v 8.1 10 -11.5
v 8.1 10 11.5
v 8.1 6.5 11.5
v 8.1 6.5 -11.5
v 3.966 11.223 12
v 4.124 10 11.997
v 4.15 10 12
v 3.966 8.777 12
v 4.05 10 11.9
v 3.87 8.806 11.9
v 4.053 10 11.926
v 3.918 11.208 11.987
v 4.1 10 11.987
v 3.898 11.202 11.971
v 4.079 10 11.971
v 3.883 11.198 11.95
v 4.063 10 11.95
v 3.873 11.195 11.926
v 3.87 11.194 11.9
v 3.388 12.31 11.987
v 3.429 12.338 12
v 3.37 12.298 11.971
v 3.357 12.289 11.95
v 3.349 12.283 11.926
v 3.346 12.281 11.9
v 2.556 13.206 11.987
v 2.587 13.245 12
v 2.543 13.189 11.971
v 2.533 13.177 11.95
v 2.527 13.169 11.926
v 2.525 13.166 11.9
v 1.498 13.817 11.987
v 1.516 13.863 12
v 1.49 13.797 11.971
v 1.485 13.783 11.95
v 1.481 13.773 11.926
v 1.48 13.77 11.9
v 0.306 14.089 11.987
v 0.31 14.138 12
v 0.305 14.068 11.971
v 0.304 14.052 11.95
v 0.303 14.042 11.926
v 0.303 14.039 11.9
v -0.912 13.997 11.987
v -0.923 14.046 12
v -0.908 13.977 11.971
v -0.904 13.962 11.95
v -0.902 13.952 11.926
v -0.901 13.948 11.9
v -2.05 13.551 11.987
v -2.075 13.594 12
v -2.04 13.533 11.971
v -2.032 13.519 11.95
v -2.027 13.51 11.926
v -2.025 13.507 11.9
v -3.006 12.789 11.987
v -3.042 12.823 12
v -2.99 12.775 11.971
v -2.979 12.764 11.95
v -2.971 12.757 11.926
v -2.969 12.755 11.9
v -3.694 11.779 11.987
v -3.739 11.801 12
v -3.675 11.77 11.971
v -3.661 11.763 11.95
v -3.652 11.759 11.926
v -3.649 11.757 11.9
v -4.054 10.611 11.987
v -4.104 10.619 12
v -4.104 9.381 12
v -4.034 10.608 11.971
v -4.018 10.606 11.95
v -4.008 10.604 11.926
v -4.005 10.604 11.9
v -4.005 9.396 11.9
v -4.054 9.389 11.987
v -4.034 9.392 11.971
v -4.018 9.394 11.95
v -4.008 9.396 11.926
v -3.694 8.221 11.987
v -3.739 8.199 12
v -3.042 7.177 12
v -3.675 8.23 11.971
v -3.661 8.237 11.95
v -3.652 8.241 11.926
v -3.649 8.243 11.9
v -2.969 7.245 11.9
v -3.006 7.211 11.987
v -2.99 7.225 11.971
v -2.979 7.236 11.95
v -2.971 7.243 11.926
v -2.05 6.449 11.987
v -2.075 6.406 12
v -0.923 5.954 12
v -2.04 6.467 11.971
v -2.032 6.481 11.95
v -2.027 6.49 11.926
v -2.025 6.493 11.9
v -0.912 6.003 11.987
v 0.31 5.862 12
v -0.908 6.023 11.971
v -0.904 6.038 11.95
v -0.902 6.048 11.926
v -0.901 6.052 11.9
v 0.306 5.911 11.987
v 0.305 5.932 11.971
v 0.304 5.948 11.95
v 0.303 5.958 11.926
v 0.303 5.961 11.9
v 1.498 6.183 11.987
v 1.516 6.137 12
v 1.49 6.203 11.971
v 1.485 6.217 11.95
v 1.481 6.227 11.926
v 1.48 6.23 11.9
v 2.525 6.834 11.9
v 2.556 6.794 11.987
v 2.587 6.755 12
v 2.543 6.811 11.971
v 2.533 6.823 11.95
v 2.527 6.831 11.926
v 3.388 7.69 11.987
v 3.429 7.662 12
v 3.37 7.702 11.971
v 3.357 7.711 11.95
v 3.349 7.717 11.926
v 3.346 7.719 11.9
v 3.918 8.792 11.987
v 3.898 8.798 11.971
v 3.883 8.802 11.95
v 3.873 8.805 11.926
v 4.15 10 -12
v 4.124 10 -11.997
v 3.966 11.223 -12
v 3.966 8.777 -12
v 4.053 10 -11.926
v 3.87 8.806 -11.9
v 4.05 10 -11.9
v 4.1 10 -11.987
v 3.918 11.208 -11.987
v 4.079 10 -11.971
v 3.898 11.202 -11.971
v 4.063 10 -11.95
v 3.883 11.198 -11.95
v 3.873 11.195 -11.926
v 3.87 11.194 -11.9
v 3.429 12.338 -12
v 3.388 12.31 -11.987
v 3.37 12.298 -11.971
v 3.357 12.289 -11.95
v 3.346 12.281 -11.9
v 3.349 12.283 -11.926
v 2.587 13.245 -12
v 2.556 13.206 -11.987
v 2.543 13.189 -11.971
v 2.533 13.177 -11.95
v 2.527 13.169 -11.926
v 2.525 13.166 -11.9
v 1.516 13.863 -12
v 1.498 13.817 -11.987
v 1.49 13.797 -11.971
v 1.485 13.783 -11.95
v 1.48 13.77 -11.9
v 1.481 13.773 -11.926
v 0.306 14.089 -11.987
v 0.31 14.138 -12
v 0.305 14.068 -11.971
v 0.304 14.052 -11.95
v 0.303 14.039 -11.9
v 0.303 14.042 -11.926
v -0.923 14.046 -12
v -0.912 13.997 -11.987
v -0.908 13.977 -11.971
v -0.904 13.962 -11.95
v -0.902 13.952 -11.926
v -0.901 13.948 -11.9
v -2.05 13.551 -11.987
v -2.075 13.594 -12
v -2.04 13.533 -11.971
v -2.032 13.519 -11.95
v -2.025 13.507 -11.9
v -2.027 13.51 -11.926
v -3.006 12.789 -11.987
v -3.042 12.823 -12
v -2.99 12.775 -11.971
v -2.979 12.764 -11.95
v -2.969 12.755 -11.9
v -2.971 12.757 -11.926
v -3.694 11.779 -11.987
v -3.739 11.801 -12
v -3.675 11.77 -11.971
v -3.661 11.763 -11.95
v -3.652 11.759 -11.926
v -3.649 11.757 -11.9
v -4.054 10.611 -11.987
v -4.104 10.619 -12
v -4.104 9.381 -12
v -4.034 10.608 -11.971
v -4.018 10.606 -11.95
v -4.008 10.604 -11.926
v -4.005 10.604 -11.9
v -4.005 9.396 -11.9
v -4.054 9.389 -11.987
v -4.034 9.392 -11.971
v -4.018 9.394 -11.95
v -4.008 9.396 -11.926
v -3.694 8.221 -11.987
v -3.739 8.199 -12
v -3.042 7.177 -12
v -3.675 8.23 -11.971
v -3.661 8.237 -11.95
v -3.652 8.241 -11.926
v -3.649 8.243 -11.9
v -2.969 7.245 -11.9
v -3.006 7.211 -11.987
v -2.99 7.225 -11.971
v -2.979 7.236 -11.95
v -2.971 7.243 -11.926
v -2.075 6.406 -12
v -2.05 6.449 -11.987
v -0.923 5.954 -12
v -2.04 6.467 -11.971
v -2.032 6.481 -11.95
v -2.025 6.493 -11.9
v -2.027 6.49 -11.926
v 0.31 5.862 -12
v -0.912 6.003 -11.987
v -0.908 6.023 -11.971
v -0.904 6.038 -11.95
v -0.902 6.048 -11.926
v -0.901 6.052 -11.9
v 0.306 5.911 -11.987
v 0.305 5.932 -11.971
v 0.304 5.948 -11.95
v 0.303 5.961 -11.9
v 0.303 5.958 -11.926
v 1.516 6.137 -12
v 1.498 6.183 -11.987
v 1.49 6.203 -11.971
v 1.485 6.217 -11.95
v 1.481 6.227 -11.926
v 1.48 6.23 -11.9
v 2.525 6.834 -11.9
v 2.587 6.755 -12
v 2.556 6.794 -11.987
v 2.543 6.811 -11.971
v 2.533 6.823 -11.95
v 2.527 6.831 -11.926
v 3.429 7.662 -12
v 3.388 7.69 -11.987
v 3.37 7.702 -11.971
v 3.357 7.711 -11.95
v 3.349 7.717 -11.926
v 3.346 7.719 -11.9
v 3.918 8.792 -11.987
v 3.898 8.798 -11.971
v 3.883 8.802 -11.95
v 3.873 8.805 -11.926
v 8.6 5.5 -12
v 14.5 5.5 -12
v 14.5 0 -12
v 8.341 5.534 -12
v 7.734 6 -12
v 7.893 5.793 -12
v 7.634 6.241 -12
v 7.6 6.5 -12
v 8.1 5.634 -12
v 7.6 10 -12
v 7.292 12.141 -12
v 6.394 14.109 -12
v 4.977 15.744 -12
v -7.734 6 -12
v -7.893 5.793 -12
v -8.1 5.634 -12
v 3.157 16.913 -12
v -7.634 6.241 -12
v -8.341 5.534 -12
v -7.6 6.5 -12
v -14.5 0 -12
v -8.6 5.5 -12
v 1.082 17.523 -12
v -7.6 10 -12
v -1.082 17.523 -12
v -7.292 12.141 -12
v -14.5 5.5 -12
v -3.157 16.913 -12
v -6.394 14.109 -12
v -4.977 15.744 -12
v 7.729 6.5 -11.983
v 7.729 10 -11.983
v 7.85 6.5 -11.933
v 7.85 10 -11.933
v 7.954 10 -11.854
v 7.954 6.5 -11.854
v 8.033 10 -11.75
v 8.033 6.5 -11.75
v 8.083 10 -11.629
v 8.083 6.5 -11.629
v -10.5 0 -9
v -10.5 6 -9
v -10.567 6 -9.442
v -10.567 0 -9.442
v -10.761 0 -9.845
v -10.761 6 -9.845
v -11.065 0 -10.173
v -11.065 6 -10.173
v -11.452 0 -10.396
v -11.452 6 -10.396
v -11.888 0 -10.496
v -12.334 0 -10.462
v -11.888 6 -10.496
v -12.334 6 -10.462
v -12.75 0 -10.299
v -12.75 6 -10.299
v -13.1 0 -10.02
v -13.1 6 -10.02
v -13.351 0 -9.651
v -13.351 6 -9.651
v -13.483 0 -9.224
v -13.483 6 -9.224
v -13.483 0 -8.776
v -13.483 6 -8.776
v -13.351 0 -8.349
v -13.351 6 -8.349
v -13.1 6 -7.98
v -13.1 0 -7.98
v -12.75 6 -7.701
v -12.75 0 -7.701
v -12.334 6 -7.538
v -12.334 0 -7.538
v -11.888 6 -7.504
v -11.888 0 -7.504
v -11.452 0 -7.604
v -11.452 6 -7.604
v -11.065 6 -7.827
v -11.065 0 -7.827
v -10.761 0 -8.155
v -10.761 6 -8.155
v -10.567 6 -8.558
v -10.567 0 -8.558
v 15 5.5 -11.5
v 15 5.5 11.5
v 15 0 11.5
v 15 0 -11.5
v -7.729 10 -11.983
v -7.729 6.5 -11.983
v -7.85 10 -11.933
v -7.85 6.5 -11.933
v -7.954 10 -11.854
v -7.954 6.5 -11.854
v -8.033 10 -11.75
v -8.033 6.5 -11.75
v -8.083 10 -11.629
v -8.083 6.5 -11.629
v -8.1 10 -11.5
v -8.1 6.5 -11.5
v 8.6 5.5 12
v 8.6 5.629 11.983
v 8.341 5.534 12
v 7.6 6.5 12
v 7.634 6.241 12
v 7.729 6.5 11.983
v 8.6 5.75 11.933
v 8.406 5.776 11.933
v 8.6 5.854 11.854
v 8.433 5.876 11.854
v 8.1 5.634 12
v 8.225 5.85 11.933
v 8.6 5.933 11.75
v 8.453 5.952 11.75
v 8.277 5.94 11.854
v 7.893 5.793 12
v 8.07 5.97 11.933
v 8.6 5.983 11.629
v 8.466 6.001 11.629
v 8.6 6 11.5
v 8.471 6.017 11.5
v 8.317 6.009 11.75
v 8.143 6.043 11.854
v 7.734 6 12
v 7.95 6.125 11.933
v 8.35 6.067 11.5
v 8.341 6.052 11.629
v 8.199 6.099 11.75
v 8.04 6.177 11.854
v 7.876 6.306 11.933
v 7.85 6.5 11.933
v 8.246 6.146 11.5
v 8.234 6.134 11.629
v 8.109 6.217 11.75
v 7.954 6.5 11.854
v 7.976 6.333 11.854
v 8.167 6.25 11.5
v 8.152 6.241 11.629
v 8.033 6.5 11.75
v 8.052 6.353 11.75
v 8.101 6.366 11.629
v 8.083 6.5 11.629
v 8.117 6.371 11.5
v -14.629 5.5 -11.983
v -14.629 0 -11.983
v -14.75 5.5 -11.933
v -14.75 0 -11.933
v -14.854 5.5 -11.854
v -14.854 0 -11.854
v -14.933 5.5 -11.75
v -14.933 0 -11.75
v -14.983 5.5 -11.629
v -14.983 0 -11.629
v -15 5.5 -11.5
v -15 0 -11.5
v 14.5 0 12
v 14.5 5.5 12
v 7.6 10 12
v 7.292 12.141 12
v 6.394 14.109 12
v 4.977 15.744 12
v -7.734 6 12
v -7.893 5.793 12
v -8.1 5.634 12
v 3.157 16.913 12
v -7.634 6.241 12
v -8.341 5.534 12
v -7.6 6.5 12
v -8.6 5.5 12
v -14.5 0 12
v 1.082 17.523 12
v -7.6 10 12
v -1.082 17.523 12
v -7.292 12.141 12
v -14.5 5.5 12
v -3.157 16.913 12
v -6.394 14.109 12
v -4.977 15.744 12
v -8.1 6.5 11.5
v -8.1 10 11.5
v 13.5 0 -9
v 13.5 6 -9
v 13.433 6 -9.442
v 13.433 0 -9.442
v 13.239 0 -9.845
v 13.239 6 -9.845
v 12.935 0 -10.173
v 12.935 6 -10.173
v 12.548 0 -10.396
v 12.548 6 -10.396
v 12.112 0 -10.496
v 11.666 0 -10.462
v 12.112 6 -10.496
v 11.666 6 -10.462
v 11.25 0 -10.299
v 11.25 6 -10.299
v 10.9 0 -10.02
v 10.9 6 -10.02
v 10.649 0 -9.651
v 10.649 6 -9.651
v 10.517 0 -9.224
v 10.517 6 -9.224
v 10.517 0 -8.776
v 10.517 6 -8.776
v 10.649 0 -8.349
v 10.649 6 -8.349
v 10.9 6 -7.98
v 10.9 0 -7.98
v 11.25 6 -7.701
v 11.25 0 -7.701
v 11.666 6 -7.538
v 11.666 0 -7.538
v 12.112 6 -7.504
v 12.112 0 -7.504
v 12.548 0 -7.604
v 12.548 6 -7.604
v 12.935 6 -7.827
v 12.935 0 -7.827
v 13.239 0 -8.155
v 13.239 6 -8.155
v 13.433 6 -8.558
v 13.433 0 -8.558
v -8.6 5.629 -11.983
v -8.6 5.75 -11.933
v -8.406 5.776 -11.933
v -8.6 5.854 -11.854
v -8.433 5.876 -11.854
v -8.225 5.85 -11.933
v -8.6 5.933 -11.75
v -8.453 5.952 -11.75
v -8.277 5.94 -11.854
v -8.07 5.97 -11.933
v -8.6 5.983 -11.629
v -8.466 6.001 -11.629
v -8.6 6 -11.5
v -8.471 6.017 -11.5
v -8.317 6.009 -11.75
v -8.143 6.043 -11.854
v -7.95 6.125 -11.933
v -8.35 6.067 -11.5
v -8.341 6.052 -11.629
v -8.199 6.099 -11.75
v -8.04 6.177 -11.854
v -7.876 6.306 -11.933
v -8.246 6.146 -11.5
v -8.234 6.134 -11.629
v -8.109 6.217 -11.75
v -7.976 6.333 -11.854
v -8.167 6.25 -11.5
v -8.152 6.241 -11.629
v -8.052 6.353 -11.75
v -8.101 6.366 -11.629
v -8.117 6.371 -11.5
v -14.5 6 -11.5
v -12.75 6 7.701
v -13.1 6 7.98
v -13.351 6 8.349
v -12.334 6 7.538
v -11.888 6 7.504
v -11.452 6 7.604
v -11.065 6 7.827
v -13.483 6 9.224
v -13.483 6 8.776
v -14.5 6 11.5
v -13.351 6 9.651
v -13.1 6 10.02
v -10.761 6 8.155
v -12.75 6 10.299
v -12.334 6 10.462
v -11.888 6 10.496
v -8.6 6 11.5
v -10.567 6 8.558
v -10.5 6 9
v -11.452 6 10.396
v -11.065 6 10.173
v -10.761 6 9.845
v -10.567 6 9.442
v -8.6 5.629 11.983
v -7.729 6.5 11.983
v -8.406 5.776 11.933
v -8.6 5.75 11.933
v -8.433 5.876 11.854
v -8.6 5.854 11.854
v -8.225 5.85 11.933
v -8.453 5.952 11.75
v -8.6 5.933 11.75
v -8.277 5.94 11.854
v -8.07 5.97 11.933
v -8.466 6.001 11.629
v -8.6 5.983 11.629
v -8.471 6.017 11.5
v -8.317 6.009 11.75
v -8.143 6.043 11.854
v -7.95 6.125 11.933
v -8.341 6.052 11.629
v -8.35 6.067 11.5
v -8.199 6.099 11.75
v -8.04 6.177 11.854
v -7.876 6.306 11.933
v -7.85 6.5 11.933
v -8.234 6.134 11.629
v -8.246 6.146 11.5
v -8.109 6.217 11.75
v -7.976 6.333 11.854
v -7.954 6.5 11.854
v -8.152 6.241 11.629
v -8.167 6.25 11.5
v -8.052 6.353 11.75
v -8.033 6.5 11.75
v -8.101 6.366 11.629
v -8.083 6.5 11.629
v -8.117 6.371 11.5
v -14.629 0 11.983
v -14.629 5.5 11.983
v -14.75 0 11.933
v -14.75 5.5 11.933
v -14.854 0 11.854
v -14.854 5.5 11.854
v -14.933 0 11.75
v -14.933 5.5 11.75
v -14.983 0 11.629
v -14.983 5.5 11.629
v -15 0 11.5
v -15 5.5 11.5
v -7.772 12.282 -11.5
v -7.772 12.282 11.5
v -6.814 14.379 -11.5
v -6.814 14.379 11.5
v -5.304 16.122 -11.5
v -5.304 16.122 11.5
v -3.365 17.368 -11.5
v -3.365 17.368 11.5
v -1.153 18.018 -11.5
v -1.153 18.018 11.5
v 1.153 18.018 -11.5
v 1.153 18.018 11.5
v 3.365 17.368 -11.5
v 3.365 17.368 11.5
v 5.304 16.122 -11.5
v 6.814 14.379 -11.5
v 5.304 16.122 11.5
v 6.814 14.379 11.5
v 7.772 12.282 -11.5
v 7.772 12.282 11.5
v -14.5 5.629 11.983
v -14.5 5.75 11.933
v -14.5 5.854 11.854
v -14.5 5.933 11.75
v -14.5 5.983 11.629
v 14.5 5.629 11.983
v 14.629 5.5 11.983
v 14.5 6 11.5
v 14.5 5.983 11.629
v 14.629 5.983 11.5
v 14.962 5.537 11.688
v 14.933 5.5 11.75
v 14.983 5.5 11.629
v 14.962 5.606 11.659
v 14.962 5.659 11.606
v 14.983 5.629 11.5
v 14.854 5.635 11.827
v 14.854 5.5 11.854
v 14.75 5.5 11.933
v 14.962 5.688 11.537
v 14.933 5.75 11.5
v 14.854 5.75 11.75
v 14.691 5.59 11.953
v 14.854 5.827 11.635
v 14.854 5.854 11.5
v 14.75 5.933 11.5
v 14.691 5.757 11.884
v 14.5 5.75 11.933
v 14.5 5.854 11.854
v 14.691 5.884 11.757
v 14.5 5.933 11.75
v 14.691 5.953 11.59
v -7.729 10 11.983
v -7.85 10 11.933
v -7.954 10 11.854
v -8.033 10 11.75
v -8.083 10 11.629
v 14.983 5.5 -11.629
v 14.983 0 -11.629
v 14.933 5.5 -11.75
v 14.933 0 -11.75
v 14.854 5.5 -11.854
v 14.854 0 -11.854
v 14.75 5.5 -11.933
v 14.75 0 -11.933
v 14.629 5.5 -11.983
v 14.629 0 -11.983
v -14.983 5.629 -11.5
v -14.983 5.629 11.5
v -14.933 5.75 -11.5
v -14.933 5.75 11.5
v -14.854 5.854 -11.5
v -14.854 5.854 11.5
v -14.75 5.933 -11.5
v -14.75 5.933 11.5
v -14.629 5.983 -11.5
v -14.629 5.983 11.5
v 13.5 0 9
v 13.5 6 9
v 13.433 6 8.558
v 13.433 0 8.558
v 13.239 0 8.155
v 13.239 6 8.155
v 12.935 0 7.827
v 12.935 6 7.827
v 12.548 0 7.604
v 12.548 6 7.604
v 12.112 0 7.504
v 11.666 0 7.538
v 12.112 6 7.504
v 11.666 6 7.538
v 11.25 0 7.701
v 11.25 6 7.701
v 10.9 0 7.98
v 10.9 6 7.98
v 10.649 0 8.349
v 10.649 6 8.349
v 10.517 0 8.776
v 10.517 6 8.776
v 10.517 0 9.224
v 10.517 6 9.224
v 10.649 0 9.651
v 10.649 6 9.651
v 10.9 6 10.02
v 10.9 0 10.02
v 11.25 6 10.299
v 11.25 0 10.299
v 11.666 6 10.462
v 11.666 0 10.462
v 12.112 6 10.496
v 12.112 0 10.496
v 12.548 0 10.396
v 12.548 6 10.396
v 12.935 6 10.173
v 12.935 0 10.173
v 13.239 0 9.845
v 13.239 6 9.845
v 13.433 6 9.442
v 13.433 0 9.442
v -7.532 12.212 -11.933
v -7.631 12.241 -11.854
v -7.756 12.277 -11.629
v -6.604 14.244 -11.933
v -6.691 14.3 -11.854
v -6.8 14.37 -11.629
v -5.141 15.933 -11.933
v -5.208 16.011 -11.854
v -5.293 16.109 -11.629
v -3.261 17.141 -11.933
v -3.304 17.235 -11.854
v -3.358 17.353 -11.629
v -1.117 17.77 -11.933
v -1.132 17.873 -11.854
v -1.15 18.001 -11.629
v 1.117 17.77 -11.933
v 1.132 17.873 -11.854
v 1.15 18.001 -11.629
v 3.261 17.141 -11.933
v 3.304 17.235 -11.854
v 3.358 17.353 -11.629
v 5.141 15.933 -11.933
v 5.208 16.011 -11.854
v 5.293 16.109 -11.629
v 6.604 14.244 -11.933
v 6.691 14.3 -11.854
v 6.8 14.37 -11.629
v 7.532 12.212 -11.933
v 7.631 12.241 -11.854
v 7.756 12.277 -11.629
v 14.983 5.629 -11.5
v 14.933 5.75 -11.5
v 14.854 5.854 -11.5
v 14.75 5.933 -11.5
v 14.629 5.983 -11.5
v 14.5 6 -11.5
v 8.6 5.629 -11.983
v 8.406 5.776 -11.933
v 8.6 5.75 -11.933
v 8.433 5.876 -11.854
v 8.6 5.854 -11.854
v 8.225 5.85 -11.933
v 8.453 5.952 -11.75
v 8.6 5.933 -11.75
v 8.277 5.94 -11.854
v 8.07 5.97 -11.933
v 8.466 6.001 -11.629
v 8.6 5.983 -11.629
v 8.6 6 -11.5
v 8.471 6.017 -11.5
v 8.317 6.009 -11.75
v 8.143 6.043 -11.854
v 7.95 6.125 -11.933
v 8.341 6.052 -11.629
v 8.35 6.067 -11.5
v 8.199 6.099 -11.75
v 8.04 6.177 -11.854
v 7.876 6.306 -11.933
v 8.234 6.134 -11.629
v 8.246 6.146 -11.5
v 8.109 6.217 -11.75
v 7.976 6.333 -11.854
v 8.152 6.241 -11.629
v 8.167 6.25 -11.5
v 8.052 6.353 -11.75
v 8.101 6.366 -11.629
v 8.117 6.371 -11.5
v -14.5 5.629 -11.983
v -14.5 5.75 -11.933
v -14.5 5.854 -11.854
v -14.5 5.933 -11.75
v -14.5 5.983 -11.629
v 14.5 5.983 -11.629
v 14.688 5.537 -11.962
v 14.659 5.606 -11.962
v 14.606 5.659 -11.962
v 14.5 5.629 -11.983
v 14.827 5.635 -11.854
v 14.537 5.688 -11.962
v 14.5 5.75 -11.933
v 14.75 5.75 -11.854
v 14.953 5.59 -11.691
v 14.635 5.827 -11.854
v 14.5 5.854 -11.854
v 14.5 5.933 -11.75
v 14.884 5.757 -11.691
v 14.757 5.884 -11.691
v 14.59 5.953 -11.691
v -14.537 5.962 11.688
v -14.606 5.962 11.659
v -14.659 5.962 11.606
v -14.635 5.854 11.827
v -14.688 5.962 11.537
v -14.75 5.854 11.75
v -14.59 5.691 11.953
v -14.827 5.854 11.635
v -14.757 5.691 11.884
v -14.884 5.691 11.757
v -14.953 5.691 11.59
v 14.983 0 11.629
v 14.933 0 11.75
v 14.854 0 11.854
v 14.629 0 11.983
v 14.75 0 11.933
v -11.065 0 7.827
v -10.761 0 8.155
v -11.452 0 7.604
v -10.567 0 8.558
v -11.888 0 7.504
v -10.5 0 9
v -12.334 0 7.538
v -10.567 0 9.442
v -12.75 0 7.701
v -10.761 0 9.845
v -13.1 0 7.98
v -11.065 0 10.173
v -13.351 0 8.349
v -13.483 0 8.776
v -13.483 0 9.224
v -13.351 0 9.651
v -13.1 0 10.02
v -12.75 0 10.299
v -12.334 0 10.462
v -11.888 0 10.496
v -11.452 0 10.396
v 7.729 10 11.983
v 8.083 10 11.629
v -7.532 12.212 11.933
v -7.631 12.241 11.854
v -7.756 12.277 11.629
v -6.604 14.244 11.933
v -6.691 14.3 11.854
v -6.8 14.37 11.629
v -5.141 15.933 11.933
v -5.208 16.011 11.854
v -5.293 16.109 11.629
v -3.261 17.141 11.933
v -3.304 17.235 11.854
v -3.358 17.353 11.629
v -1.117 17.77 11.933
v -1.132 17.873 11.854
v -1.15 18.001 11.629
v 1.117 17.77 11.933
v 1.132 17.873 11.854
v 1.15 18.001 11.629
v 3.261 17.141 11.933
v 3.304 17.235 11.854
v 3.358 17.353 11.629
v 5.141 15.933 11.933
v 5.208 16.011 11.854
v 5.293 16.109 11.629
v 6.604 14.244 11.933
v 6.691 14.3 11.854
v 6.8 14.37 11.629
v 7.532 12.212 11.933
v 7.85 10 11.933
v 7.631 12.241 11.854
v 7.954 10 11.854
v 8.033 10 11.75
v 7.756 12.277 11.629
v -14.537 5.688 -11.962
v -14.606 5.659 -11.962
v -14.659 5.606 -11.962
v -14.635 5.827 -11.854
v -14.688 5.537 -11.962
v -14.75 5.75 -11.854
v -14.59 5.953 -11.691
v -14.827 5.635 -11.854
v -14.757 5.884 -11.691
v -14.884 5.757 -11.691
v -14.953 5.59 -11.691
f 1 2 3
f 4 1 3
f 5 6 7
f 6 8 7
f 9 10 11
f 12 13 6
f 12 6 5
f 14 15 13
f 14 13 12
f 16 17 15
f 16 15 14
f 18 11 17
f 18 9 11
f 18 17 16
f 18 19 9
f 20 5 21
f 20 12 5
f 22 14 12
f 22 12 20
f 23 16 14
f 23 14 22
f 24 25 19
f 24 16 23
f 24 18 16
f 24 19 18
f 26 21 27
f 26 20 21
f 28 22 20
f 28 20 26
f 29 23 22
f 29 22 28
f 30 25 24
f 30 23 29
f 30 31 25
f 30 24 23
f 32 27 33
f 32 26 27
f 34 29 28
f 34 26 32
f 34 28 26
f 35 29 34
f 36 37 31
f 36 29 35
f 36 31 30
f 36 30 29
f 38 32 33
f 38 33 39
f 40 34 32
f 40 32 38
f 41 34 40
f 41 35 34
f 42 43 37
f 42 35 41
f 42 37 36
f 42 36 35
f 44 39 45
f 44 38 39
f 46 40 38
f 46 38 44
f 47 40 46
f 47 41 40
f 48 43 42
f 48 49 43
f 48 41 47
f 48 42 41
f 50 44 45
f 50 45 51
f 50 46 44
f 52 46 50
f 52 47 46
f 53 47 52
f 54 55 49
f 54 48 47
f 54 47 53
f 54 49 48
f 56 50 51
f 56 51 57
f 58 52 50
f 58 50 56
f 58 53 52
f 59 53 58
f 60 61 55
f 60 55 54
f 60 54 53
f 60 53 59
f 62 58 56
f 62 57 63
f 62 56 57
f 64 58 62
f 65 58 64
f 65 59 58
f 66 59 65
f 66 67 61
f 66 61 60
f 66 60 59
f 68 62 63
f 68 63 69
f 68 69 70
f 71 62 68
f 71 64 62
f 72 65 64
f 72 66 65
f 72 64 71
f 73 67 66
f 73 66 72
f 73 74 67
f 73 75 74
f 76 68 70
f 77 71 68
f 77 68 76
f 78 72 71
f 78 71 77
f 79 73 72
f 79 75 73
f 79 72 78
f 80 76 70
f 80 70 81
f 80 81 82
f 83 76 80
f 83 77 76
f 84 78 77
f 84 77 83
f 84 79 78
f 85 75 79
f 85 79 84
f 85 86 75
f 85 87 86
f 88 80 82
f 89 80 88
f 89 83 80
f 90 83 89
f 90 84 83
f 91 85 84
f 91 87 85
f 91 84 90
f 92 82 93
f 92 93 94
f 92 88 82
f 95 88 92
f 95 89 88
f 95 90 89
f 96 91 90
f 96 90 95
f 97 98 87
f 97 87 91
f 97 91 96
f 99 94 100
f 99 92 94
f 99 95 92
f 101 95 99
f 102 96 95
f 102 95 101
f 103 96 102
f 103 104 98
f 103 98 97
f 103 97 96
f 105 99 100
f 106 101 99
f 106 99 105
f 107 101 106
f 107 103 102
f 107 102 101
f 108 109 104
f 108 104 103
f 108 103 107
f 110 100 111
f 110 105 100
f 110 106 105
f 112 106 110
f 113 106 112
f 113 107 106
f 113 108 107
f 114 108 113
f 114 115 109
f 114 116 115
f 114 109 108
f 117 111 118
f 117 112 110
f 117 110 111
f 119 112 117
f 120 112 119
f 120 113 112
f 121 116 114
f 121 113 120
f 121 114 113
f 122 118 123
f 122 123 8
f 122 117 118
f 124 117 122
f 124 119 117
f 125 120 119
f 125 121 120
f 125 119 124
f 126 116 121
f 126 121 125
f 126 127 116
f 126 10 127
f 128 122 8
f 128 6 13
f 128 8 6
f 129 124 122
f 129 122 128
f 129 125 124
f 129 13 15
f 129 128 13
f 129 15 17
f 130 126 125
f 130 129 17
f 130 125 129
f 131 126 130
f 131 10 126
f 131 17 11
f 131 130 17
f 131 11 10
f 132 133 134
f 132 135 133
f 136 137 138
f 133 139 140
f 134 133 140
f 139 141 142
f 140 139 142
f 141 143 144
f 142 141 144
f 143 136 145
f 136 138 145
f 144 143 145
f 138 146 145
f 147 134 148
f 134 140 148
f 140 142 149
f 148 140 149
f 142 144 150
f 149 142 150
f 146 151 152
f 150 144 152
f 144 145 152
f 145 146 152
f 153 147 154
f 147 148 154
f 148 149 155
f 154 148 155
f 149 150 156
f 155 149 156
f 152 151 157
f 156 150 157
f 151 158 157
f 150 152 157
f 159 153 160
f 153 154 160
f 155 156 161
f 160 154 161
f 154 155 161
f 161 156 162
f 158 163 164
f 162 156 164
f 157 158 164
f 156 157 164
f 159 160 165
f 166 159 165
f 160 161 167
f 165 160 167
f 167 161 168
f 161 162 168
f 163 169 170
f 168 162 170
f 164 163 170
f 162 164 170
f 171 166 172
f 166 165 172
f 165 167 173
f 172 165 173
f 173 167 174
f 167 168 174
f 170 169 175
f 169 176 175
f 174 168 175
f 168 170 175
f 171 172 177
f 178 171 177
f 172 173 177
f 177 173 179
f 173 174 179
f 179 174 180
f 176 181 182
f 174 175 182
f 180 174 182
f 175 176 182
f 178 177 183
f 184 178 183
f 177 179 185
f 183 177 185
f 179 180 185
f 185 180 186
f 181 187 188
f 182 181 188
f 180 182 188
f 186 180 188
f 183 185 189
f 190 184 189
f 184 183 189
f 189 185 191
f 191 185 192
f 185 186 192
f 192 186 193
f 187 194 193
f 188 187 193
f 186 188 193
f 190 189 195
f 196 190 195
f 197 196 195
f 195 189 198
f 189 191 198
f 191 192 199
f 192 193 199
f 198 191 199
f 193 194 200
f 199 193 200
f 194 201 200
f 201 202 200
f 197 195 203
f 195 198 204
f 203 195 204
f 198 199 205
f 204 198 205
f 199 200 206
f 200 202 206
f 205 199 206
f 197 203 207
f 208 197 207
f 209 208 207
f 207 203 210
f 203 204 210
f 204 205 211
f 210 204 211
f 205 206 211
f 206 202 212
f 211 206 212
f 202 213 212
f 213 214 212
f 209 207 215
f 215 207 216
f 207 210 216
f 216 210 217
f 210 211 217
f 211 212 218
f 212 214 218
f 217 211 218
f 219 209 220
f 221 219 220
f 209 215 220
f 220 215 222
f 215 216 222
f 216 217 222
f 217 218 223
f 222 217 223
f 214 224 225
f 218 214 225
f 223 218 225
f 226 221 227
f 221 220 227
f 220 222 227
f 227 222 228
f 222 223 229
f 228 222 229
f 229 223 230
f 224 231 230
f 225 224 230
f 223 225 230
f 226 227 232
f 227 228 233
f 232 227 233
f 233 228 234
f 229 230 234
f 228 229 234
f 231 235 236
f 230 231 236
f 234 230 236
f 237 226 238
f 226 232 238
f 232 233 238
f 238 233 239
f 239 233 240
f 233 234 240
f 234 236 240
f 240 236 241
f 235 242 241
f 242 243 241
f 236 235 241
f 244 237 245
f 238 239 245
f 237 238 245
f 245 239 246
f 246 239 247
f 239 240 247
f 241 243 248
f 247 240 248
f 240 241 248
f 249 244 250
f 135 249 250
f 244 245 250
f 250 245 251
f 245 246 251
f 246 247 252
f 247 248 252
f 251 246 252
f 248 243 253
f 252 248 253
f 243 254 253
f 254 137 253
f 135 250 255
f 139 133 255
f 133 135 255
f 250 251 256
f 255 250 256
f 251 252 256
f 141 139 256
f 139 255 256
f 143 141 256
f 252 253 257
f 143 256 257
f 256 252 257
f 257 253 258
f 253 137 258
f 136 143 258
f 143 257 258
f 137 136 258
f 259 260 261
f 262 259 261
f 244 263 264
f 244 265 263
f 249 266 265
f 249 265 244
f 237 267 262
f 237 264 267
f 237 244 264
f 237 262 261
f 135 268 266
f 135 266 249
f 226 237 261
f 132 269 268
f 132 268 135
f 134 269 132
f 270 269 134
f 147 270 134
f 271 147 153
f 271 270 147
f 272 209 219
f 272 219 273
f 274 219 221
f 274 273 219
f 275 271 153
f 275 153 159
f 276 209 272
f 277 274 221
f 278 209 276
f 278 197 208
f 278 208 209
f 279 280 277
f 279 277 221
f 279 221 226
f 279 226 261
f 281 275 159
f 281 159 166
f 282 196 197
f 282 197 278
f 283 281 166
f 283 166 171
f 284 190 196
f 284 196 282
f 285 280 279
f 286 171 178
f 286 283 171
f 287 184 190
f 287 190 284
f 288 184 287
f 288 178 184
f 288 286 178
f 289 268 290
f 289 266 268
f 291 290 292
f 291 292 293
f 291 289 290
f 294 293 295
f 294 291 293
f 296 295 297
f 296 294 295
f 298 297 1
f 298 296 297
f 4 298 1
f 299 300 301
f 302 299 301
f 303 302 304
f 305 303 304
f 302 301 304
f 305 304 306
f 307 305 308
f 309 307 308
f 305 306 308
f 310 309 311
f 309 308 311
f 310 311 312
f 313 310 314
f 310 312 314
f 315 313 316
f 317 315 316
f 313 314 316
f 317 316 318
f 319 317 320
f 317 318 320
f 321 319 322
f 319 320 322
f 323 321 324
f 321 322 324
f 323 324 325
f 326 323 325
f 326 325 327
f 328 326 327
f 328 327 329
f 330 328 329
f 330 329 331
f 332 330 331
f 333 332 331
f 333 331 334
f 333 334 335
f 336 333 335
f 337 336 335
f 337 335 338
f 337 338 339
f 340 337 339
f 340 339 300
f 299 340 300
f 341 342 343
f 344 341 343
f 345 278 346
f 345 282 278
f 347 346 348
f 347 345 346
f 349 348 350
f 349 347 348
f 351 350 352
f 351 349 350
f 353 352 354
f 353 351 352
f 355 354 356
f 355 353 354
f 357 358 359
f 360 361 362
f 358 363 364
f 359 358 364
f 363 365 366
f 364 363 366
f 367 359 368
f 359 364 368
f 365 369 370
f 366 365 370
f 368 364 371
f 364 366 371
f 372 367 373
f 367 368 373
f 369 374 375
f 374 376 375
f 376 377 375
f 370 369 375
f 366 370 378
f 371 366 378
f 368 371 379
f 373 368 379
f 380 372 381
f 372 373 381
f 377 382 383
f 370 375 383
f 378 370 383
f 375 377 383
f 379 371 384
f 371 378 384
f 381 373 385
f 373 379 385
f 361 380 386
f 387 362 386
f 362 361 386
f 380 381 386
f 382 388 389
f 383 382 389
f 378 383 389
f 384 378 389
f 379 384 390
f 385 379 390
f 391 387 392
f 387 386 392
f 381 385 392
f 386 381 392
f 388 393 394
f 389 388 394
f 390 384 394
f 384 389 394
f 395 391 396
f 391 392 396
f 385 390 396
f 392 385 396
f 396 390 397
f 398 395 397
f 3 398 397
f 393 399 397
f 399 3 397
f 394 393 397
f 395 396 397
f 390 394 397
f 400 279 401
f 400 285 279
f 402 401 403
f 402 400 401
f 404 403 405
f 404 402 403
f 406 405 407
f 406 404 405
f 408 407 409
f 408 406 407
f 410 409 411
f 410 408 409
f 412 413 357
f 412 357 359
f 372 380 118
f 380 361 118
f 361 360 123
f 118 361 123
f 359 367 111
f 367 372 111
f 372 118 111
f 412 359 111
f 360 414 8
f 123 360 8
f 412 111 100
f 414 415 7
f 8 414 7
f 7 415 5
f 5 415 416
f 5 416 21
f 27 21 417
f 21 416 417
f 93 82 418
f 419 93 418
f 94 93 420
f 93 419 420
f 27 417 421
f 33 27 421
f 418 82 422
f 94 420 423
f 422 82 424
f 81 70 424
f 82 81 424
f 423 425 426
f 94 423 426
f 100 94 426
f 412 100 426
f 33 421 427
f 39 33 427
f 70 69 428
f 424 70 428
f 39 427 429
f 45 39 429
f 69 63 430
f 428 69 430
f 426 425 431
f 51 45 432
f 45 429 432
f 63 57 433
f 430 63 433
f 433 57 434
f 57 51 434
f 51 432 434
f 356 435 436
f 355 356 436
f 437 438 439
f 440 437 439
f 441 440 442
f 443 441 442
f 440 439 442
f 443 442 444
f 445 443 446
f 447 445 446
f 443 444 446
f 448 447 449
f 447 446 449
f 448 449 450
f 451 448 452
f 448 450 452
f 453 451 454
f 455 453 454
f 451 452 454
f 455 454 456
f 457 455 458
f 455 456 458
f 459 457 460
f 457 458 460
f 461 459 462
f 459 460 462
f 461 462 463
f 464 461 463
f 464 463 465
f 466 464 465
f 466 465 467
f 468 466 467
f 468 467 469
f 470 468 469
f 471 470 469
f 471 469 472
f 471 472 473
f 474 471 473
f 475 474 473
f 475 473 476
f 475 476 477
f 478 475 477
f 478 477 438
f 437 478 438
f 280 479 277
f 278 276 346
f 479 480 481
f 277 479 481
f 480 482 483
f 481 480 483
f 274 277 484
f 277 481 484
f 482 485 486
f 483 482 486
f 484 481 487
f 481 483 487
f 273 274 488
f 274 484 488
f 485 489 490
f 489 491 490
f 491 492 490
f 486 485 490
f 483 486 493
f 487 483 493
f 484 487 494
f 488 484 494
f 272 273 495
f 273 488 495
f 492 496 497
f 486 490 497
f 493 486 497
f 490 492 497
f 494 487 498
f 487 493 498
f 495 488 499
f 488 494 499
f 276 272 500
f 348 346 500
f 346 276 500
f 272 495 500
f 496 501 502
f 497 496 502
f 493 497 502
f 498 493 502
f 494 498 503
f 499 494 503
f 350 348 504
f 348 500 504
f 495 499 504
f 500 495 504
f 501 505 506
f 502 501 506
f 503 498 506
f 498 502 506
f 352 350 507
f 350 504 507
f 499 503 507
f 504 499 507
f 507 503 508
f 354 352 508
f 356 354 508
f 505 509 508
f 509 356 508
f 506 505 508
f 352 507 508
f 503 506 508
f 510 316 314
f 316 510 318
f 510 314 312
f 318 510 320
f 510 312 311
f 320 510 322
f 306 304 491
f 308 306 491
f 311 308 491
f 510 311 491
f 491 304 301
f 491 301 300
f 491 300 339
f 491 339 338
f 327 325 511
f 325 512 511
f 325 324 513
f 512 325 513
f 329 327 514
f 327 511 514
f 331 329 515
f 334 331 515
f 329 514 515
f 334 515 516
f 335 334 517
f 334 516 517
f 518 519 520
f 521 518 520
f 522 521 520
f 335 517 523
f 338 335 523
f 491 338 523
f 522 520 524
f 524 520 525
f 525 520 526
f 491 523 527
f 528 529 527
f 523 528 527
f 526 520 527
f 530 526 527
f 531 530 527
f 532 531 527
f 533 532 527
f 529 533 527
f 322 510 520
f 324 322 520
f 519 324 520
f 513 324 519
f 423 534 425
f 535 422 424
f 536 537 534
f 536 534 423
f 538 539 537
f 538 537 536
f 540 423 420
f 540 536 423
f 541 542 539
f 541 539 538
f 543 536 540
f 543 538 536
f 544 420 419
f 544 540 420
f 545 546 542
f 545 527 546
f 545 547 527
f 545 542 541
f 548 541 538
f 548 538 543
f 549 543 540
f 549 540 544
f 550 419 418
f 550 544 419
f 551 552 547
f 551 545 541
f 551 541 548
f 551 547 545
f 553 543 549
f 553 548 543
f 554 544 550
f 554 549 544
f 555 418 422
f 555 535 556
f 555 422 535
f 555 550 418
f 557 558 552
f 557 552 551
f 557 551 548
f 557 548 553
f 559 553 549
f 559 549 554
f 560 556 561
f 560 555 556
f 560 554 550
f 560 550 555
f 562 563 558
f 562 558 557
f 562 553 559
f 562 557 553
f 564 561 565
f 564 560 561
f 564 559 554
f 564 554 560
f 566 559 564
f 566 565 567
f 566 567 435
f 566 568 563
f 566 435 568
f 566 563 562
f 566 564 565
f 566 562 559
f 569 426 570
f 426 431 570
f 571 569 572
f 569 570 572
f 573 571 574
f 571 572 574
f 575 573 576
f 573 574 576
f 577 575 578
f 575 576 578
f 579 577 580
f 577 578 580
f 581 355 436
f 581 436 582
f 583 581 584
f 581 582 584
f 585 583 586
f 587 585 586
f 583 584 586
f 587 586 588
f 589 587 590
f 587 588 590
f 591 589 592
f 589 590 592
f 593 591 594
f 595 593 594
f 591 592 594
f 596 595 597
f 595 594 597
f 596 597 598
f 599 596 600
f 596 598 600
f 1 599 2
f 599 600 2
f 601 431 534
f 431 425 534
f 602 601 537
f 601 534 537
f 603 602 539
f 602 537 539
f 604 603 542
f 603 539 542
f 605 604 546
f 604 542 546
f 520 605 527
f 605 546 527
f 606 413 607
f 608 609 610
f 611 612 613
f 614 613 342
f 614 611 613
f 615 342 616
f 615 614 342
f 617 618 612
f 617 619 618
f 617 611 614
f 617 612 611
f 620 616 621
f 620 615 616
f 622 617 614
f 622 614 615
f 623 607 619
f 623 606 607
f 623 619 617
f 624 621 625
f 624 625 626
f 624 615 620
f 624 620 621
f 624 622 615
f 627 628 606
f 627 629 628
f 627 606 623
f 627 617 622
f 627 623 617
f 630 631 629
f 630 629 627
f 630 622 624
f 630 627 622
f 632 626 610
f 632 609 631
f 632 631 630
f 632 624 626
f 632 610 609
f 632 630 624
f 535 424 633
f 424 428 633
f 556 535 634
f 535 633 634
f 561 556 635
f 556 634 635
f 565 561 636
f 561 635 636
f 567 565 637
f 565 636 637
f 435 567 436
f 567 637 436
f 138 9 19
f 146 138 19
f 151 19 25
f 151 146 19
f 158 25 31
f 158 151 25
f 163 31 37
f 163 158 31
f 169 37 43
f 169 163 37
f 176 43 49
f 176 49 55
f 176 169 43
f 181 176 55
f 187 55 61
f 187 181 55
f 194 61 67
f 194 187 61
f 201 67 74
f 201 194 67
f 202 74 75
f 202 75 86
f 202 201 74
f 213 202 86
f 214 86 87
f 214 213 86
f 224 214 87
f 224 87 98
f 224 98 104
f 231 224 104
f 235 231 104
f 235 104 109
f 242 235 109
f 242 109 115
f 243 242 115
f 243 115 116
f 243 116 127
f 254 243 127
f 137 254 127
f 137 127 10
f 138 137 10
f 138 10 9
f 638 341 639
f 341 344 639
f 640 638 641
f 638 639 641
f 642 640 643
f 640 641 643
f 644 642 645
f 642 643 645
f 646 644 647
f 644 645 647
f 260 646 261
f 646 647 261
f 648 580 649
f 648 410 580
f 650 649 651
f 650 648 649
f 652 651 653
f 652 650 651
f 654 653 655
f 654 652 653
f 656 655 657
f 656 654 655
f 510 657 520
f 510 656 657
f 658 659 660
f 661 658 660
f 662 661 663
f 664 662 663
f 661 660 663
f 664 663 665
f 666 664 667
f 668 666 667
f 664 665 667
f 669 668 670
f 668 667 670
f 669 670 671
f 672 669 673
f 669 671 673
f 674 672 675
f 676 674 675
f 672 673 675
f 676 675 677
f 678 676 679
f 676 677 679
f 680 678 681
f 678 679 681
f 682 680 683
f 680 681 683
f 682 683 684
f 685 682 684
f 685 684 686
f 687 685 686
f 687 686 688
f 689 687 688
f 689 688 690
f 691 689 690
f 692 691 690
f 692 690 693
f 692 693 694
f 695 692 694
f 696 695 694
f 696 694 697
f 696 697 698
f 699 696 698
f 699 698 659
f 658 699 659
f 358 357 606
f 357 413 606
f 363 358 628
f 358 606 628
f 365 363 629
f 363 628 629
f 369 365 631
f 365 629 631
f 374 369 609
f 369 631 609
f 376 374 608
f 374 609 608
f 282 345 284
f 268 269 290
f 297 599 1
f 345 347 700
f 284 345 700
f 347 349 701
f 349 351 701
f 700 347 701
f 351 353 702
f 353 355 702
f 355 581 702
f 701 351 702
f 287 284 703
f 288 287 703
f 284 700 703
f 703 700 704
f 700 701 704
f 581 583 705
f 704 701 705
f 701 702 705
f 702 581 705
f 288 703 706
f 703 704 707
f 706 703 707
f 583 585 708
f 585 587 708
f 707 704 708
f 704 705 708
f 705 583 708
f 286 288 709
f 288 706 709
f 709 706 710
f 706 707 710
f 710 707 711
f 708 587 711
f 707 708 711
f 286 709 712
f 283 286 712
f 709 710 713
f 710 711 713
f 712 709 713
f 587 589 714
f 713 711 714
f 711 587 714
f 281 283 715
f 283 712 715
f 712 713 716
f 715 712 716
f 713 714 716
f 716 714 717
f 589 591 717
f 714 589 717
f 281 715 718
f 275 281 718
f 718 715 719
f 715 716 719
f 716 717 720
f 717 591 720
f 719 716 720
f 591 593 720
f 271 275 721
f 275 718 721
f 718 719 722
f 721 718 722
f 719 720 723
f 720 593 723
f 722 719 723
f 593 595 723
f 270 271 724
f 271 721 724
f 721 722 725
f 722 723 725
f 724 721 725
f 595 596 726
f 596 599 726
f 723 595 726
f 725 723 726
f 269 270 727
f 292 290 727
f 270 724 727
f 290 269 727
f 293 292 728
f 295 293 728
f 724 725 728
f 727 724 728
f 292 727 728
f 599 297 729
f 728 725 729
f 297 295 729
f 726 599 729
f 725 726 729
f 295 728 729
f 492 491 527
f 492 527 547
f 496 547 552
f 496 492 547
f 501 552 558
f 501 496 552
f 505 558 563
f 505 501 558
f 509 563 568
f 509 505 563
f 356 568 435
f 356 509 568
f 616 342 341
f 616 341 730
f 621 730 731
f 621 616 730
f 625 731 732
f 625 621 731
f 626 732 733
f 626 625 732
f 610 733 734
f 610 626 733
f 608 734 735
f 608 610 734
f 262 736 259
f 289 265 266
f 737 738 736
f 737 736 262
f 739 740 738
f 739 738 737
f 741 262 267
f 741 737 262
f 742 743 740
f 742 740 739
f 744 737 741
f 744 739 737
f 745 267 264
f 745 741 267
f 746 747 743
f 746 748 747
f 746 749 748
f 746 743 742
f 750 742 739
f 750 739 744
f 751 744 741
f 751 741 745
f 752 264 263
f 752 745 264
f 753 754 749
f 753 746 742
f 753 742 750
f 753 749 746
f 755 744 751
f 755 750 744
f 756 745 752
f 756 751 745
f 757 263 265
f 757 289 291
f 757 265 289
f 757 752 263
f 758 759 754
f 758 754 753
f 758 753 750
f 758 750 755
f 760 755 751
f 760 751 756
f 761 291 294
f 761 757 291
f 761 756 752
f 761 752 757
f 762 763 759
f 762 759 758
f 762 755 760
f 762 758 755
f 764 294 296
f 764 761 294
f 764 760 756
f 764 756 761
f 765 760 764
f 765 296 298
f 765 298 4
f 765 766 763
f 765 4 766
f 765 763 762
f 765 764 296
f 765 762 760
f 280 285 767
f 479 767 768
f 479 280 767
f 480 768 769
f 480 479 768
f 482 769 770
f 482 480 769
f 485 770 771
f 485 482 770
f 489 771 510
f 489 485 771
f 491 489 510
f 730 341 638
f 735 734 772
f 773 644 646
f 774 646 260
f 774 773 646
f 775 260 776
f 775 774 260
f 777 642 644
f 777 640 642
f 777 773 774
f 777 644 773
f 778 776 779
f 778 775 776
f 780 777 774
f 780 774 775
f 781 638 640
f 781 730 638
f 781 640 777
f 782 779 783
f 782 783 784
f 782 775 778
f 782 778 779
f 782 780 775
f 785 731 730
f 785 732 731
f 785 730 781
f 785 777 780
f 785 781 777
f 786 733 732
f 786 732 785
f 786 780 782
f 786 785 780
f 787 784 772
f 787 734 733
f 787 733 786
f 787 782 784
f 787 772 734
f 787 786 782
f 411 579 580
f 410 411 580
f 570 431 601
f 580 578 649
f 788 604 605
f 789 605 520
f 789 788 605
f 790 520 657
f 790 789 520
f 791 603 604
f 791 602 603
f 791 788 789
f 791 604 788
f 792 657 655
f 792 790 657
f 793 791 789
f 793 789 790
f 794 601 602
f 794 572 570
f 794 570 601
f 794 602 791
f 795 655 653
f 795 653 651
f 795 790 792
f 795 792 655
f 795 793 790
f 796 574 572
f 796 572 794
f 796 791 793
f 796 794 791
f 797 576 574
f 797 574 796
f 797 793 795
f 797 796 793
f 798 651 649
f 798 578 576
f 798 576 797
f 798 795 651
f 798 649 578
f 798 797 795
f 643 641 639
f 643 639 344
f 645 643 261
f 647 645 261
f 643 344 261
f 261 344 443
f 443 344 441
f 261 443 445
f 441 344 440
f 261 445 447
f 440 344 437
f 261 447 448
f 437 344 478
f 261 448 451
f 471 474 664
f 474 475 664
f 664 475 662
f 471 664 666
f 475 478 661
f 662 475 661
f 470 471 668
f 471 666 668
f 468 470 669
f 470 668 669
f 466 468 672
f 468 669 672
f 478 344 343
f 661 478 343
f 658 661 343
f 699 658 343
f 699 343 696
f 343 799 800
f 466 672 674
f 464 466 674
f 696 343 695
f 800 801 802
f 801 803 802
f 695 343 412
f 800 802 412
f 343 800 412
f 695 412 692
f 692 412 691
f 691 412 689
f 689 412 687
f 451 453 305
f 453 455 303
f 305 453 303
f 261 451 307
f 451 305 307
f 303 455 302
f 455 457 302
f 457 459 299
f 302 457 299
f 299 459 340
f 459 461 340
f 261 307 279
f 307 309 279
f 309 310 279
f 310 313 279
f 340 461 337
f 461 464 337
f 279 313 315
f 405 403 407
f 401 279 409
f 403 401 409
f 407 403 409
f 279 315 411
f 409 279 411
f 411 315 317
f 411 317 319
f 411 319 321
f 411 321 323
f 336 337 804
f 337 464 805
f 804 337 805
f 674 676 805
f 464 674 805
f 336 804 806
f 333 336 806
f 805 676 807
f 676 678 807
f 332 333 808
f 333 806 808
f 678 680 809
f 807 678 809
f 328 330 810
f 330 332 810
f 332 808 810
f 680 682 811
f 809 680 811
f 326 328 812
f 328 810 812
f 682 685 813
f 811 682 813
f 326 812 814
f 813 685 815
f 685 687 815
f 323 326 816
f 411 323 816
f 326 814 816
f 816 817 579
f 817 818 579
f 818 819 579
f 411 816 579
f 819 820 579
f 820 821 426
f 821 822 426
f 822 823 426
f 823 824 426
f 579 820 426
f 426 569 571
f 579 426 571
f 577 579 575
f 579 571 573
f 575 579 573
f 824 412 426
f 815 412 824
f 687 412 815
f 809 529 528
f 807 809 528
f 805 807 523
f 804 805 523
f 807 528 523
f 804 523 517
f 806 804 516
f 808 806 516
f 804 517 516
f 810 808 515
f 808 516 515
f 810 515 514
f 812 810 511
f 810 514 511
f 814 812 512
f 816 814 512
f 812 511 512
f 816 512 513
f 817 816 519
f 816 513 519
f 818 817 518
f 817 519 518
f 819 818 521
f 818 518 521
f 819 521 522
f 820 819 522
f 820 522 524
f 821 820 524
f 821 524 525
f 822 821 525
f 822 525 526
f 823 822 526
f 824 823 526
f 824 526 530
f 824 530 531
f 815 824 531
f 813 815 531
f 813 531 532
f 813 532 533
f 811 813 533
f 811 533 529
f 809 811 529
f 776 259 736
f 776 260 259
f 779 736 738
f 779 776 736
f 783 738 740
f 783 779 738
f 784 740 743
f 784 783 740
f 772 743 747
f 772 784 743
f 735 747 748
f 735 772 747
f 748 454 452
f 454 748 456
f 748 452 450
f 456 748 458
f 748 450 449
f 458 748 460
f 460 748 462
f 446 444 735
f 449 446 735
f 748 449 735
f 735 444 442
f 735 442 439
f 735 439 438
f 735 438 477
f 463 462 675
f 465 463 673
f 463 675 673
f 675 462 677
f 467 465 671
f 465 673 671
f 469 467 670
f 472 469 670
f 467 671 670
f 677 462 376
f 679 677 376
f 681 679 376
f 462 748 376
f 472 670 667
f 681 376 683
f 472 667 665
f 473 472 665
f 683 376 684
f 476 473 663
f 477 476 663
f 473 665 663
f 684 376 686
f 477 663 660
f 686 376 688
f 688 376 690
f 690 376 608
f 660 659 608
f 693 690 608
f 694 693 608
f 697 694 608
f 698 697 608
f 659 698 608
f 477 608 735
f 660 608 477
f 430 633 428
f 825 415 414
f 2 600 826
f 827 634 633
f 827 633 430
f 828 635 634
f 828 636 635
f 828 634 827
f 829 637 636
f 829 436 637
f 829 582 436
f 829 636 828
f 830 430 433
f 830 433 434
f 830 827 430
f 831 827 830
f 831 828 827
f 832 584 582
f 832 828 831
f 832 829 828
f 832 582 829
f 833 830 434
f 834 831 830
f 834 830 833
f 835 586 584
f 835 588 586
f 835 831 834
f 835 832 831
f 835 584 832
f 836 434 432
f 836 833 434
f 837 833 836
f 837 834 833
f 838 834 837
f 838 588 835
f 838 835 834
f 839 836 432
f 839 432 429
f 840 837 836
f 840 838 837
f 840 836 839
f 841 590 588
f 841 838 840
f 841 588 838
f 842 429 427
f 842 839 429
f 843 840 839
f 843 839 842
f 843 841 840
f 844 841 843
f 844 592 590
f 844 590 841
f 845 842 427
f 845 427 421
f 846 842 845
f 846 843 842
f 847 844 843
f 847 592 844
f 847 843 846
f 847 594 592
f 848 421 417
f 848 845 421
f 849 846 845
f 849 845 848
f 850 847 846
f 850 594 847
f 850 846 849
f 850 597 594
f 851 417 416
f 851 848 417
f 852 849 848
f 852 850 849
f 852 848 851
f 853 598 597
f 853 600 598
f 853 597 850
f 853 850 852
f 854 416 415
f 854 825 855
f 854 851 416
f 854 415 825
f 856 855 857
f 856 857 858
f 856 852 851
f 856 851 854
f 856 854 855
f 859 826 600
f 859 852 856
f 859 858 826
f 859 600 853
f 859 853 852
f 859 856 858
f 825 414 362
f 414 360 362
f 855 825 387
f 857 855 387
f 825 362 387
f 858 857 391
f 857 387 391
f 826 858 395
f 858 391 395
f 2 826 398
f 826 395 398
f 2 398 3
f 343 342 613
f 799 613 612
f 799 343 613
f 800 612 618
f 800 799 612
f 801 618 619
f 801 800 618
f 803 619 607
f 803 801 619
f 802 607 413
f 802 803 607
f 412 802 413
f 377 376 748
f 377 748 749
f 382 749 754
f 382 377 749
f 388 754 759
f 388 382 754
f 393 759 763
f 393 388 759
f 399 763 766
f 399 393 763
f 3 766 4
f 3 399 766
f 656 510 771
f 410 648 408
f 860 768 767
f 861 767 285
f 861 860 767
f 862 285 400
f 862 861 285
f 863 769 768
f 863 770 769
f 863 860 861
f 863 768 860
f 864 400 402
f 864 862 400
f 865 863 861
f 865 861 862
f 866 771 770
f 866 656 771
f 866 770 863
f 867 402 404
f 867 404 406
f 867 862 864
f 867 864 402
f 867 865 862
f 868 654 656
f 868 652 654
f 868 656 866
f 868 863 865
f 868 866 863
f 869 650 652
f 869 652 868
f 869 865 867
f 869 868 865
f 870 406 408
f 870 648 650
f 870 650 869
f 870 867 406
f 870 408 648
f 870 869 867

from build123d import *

# Parameters (mm, degrees)
CROQUIS1_R              = 4.05
SALIENTE_EXTRUIR1_DEPTH = 12
CORTAR_EXTRUIR1_REACH   = 8
CROQUIS2_R              = 1.5
REDONDEO1_R             = 0.5
REDONDEO2_R             = 0.1


with BuildPart() as part:
    # Croquis1 → Saliente-Extruir1 (new body, symmetric)
    with BuildSketch(Plane.XY):
        with BuildLine():
            Line((15, 0), (-15, 0))
            Line((-15, 0), (-15, 6))
            Line((-15, 6), (-8.1, 6))
            Line((-8.1, 6), (-8.1, 10))
            ThreePointArc((-8.1, 10), (0, 18.1), (8.1, 10))
            Line((8.1, 10), (8.1, 6))
            Line((8.1, 6), (15, 6))
            Line((15, 6), (15, 0))
        make_face()
        with Locations((0, 10)):
            Circle(CROQUIS1_R, mode=Mode.SUBTRACT)
    extrude(amount=SALIENTE_EXTRUIR1_DEPTH, both=True)

    # Croquis2 → Cortar-Extruir1 (cut, up to next)
    with BuildSketch(Plane(origin=(0, 6, 0), x_dir=(1, 0, 0), z_dir=(0, 1, 0)), mode=Mode.PRIVATE) as cortar_extruir1_sk1:
        with Locations((-12, 9)):
            Circle(CROQUIS2_R)
    cortar_extruir1_tool1 = extrude(cortar_extruir1_sk1.sketch, amount=-CORTAR_EXTRUIR1_REACH, mode=Mode.PRIVATE) & part.part
    add(cortar_extruir1_tool1.solids().sort_by_distance((-12, 6, -9))[0], mode=Mode.SUBTRACT)
    # Croquis2 → Cortar-Extruir1 (cut, up to next)
    with BuildSketch(Plane(origin=(0, 6, 0), x_dir=(1, 0, 0), z_dir=(0, 1, 0)), mode=Mode.PRIVATE) as cortar_extruir1_sk2:
        with Locations((12, 9)):
            Circle(CROQUIS2_R)
    cortar_extruir1_tool2 = extrude(cortar_extruir1_sk2.sketch, amount=-CORTAR_EXTRUIR1_REACH, mode=Mode.PRIVATE) & part.part
    add(cortar_extruir1_tool2.solids().sort_by_distance((12, 6, -9))[0], mode=Mode.SUBTRACT)
    # Croquis2 → Cortar-Extruir1 (cut, up to next)
    with BuildSketch(Plane(origin=(0, 6, 0), x_dir=(1, 0, 0), z_dir=(0, 1, 0)), mode=Mode.PRIVATE) as cortar_extruir1_sk3:
        with Locations((-12, -9)):
            Circle(CROQUIS2_R)
    cortar_extruir1_tool3 = extrude(cortar_extruir1_sk3.sketch, amount=-CORTAR_EXTRUIR1_REACH, mode=Mode.PRIVATE) & part.part
    add(cortar_extruir1_tool3.solids().sort_by_distance((-12, 6, 9))[0], mode=Mode.SUBTRACT)
    # Croquis2 → Cortar-Extruir1 (cut, up to next)
    with BuildSketch(Plane(origin=(0, 6, 0), x_dir=(1, 0, 0), z_dir=(0, 1, 0)), mode=Mode.PRIVATE) as cortar_extruir1_sk4:
        with Locations((12, -9)):
            Circle(CROQUIS2_R)
    cortar_extruir1_tool4 = extrude(cortar_extruir1_sk4.sketch, amount=-CORTAR_EXTRUIR1_REACH, mode=Mode.PRIVATE) & part.part
    add(cortar_extruir1_tool4.solids().sort_by_distance((12, 6, 9))[0], mode=Mode.SUBTRACT)

    # Redondeo1
    redondeo1_edges = [part.edges().sort_by_distance(p)[0] for p in [
        (8.1, 8, -12),
        (11.55, 6, 12),
        (15, 3, 12),
        (-15, 3, 12),
        (-11.55, 6, 12),
        (-8.1, 8, 12),
        (0, 18.1, 12),
        (8.1, 8, 12),
        (0, 18.1, -12),
        (8.1, 6, 0),
        (15, 6, 0),
        (-15, 6, 0),
        (-8.1, 6, 0),
        (-8.1, 8, -12),
        (-11.55, 6, -12),
        (-15, 3, -12),
        (15, 3, -12),
        (11.55, 6, -12),
    ]]
    fillet(redondeo1_edges, radius=REDONDEO1_R)

    # Redondeo2
    redondeo2_edges = [part.edges().sort_by_distance(p)[0] for p in [
        (-4.05, 10, 12),
        (-4.05, 10, -12),
    ]]
    fillet(redondeo2_edges, radius=REDONDEO2_R)


solid = part.part
